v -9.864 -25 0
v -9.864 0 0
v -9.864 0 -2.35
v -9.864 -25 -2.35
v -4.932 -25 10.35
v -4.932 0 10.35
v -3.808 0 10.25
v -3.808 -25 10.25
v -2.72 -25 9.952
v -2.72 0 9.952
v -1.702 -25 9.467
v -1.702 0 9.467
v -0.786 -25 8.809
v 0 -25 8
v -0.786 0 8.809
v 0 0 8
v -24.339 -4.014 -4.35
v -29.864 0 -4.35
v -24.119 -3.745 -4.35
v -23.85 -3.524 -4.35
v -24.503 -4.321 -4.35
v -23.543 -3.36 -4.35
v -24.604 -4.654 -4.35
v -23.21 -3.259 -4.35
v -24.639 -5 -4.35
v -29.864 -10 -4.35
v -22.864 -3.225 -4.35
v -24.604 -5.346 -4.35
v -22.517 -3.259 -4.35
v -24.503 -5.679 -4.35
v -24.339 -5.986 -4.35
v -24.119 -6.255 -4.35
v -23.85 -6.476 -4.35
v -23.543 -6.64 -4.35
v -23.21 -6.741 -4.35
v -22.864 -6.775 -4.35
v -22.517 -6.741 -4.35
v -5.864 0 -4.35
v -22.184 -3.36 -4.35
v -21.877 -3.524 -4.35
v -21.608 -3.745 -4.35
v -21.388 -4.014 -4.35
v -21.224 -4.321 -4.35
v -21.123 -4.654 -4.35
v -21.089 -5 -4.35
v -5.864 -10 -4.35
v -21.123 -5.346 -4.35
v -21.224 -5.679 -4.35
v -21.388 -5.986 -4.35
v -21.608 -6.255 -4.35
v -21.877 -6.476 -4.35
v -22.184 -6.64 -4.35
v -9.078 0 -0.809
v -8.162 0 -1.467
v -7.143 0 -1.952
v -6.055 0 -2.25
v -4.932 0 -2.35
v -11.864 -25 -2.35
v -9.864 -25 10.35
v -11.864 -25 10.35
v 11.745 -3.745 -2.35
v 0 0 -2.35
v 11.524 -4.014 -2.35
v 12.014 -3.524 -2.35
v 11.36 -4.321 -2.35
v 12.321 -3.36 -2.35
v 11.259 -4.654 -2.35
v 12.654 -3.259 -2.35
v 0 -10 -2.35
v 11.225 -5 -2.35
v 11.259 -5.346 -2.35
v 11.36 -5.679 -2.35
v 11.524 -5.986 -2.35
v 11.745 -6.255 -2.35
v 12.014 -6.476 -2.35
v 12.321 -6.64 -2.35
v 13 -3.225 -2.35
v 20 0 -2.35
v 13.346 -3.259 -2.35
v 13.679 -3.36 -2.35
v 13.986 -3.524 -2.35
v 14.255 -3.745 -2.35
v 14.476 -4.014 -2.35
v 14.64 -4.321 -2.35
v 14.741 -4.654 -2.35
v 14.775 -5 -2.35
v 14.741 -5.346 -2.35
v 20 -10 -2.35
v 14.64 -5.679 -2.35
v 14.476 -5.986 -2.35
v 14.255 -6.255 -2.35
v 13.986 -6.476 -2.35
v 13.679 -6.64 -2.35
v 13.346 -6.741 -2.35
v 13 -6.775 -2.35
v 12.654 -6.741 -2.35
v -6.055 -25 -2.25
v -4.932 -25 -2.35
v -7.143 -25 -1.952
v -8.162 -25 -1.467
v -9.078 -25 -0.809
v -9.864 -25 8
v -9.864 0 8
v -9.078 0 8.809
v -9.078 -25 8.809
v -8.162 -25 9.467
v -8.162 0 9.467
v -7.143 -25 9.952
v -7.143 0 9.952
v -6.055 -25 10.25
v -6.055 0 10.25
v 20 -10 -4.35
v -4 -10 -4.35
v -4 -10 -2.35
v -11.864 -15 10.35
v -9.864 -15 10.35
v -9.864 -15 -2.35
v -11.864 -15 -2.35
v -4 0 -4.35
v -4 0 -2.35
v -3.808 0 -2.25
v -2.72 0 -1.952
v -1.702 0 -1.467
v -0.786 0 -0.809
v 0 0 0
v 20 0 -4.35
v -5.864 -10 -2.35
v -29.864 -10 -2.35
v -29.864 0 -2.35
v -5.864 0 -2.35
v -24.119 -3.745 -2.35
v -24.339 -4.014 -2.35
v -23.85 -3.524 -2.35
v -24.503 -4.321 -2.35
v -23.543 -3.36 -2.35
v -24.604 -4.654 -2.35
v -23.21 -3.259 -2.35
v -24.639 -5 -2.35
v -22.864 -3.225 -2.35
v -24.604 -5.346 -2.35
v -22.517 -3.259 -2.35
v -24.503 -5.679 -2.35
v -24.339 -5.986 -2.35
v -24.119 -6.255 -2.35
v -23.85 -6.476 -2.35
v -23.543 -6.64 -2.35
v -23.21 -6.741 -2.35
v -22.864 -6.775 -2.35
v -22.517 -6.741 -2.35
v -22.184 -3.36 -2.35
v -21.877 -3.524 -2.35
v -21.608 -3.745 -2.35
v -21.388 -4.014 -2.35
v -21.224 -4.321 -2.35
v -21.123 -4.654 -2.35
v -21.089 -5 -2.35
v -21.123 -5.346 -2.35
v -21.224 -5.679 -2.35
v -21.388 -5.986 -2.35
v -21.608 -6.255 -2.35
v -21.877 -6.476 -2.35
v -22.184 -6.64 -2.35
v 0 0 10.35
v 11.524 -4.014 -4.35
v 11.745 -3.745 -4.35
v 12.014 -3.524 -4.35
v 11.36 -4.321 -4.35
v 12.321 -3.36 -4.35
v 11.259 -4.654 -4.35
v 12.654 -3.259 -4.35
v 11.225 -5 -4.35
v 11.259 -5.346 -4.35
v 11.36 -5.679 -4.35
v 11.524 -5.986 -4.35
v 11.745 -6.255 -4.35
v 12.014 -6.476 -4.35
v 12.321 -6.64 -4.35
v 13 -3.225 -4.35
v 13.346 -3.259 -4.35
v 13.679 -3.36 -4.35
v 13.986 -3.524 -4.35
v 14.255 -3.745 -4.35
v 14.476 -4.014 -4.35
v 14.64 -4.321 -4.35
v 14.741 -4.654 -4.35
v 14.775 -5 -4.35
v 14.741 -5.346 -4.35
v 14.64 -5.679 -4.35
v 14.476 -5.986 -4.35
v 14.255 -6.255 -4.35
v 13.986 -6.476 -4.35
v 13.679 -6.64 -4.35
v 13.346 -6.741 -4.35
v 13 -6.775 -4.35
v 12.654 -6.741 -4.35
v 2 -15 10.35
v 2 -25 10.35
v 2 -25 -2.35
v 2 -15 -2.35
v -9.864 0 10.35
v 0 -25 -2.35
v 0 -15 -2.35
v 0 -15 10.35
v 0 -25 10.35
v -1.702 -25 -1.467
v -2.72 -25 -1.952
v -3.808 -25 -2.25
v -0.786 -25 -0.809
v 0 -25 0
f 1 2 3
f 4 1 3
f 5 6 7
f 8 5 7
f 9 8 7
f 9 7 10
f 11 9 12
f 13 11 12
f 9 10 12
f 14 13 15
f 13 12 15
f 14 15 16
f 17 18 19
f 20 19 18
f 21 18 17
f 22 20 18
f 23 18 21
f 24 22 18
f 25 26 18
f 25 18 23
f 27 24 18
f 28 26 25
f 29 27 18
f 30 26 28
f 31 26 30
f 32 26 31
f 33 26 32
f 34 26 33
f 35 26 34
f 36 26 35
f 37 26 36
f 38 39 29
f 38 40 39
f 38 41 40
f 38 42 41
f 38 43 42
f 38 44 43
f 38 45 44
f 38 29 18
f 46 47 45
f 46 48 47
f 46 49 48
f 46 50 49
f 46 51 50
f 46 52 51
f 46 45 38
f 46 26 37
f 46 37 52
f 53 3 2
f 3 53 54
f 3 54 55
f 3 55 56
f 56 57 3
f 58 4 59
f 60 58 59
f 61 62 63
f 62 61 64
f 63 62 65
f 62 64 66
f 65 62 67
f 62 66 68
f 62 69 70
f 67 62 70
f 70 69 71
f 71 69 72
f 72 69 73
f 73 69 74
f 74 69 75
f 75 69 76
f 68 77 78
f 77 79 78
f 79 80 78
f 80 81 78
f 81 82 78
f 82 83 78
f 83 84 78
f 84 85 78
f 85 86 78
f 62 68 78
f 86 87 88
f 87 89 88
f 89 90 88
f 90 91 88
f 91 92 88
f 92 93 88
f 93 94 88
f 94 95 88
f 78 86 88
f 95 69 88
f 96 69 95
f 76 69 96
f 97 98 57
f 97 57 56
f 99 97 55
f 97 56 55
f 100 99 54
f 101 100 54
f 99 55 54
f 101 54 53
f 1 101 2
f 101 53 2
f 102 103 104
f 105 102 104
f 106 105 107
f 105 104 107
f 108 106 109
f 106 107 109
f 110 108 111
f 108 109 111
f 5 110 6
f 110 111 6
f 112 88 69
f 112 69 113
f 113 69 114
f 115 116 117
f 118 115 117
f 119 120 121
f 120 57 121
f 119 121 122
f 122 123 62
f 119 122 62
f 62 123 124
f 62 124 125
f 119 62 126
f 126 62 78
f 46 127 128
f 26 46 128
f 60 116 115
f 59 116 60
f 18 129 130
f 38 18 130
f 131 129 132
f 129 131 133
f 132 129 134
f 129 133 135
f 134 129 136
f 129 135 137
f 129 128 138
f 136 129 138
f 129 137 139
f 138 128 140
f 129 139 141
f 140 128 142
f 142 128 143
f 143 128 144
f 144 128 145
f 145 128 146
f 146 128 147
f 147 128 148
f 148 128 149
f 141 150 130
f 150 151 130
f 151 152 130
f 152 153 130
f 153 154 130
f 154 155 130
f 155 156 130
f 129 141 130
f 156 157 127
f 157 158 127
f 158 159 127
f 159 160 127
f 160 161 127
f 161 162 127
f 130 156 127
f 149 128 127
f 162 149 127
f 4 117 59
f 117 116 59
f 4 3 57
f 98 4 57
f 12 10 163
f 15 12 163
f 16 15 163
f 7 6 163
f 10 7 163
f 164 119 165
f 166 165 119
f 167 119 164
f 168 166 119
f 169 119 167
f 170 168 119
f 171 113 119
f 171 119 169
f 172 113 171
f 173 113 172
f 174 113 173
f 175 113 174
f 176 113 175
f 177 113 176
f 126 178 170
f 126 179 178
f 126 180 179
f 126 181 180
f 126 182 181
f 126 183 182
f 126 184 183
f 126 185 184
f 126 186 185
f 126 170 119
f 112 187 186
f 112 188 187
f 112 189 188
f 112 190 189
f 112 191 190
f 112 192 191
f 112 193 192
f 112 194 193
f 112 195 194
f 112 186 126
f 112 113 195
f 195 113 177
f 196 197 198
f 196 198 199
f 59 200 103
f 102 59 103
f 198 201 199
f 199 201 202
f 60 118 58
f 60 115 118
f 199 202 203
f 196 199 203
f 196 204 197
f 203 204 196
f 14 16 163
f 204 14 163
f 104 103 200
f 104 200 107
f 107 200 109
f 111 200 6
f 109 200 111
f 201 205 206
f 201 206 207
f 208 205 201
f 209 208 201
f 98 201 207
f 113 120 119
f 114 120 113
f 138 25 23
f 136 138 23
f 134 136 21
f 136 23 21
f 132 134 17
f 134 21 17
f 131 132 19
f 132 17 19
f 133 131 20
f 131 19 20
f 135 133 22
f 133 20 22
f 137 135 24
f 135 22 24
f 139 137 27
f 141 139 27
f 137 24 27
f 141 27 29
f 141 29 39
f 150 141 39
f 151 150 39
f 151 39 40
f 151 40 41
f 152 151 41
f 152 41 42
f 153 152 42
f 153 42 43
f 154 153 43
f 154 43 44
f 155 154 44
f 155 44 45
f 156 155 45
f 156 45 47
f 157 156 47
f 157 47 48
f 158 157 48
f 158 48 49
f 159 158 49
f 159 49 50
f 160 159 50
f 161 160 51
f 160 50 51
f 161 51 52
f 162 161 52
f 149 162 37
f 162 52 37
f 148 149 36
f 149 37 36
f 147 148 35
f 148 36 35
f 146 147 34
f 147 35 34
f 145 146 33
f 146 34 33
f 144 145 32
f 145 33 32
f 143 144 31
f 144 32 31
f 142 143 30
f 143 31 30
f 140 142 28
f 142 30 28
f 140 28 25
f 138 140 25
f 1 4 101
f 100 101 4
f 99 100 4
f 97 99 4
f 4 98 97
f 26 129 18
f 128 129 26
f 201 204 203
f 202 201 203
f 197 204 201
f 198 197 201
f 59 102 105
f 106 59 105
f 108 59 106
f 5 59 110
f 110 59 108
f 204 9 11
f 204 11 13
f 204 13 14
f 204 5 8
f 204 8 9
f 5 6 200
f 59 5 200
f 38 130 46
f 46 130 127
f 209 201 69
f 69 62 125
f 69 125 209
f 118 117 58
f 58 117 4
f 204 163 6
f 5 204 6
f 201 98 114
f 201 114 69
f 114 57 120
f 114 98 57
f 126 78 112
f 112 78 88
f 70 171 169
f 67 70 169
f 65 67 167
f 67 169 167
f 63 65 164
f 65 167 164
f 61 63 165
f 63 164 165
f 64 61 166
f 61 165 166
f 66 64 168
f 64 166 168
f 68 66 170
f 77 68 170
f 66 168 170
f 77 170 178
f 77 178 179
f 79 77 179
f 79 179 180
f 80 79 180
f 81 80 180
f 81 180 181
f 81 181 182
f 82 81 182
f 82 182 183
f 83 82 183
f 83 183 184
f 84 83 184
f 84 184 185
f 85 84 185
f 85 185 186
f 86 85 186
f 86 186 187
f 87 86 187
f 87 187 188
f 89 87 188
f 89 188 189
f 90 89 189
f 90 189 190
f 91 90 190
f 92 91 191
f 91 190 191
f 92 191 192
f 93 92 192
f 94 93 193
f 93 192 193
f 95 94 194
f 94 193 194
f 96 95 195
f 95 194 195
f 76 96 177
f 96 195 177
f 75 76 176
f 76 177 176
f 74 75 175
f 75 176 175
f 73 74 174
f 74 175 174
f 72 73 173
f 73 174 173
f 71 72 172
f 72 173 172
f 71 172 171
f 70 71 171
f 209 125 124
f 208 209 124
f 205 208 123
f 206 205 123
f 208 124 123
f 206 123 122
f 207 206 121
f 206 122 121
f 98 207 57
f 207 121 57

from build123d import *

# Parameters (mm, degrees)
F1_DEPTH  = 25
F2_W      = 10
F2_H      = 10.350019
F2_H_2    = 2.35
F3_DEPTH  = 2
F4_W      = 10
F4_H      = 2.35
F4_H_2    = 10.35
F5_DEPTH  = 2
F6_W      = 20
F6_H      = 10
F6_W_2    = 4
F7_DEPTH  = 2
F9_D      = 3.55
F10_W     = 20
F10_H     = 10
F10_W_2   = 4
F11_DEPTH = 2
F13_D     = 3.55


with BuildPart() as f1:
    # F0 (on Front) → F1 (new body)
    with BuildSketch(Plane.XZ):
        with BuildLine():
            Line((-9.863569, 10.35), (-9.863569, 8))
            ThreePointArc((-9.863569, 8), (-7.663314, 9.732473), (-4.931785, 10.35))
            Line((-4.931785, 10.35), (-9.863569, 10.35))
        make_face()
        with BuildLine():
            Line((0, 10.35), (-4.931785, 10.35))
            ThreePointArc((-4.931785, 10.35), (-2.200256, 9.732473), (0, 8))
            Line((0, 8), (0, 10.35))
        make_face()
        with BuildLine():
            ThreePointArc((-4.931785, -2.35), (-7.663314, -1.732473), (-9.863569, 0))
            Line((-9.863569, 0), (-9.863569, -2.35))
            Line((-9.863569, -2.35), (-4.931785, -2.35))
        make_face()
        with BuildLine():
            ThreePointArc((0, 0), (-2.200256, -1.732473), (-4.931785, -2.35))
            Line((-4.931785, -2.35), (0, -2.35))
            Line((0, -2.35), (0, 0))
        make_face()
    extrude(amount=F1_DEPTH)

    # F10 (on face) → F11 (join)
    with BuildSketch(Plane(origin=(0, 0, -2.35), x_dir=(1, 0, 0), z_dir=(0, 0, -1))):
        with Locations((10, 5)):
            Rectangle(F10_W, F10_H)
        with Locations((-2, 5)):
            Rectangle(F10_W_2, F10_H)
    extrude(amount=F11_DEPTH)

    # F13 (through all)
    with Locations(Plane.XY.offset(-2.35)):
        with Locations((13, -5)):
            Hole(F13_D / 2)


with BuildPart() as f3:
    # F2 (on face) → F3 (new body)
    with BuildSketch(Plane(origin=(-9.863569, 0, 0), x_dir=(0, -1, 0), z_dir=(-1, 0, 0))):
        with Locations((20, 2.824991)):
            Rectangle(F2_W, F2_H)
        with Locations((20, 9.175)):
            Rectangle(F2_W, F2_H_2)
    extrude(amount=F3_DEPTH)


with BuildPart() as f5:
    # F4 (on face) → F5 (new body)
    with BuildSketch(Plane.YZ):
        with Locations((-20, 9.175)):
            Rectangle(F4_W, F4_H)
        with Locations((-20, 2.825)):
            Rectangle(F4_W, F4_H_2)
    extrude(amount=F5_DEPTH)


with BuildPart() as f7:
    # F6 (on face) → F7 (new body)
    with BuildSketch(Plane(origin=(0, 0, -2.35), x_dir=(1, 0, 0), z_dir=(0, 0, -1))):
        with Locations((-19.863569, 5)):
            Rectangle(F6_W, F6_H)
        with Locations((-7.863569, 5)):
            Rectangle(F6_W_2, F6_H)
    extrude(amount=F7_DEPTH)

    # F9 (through all)
    with Locations(Plane.XY.offset(-2.35)):
        with Locations((-22.863569, -5)):
            Hole(F9_D / 2)


solid = Compound([f1.part, f3.part, f5.part, f7.part])
